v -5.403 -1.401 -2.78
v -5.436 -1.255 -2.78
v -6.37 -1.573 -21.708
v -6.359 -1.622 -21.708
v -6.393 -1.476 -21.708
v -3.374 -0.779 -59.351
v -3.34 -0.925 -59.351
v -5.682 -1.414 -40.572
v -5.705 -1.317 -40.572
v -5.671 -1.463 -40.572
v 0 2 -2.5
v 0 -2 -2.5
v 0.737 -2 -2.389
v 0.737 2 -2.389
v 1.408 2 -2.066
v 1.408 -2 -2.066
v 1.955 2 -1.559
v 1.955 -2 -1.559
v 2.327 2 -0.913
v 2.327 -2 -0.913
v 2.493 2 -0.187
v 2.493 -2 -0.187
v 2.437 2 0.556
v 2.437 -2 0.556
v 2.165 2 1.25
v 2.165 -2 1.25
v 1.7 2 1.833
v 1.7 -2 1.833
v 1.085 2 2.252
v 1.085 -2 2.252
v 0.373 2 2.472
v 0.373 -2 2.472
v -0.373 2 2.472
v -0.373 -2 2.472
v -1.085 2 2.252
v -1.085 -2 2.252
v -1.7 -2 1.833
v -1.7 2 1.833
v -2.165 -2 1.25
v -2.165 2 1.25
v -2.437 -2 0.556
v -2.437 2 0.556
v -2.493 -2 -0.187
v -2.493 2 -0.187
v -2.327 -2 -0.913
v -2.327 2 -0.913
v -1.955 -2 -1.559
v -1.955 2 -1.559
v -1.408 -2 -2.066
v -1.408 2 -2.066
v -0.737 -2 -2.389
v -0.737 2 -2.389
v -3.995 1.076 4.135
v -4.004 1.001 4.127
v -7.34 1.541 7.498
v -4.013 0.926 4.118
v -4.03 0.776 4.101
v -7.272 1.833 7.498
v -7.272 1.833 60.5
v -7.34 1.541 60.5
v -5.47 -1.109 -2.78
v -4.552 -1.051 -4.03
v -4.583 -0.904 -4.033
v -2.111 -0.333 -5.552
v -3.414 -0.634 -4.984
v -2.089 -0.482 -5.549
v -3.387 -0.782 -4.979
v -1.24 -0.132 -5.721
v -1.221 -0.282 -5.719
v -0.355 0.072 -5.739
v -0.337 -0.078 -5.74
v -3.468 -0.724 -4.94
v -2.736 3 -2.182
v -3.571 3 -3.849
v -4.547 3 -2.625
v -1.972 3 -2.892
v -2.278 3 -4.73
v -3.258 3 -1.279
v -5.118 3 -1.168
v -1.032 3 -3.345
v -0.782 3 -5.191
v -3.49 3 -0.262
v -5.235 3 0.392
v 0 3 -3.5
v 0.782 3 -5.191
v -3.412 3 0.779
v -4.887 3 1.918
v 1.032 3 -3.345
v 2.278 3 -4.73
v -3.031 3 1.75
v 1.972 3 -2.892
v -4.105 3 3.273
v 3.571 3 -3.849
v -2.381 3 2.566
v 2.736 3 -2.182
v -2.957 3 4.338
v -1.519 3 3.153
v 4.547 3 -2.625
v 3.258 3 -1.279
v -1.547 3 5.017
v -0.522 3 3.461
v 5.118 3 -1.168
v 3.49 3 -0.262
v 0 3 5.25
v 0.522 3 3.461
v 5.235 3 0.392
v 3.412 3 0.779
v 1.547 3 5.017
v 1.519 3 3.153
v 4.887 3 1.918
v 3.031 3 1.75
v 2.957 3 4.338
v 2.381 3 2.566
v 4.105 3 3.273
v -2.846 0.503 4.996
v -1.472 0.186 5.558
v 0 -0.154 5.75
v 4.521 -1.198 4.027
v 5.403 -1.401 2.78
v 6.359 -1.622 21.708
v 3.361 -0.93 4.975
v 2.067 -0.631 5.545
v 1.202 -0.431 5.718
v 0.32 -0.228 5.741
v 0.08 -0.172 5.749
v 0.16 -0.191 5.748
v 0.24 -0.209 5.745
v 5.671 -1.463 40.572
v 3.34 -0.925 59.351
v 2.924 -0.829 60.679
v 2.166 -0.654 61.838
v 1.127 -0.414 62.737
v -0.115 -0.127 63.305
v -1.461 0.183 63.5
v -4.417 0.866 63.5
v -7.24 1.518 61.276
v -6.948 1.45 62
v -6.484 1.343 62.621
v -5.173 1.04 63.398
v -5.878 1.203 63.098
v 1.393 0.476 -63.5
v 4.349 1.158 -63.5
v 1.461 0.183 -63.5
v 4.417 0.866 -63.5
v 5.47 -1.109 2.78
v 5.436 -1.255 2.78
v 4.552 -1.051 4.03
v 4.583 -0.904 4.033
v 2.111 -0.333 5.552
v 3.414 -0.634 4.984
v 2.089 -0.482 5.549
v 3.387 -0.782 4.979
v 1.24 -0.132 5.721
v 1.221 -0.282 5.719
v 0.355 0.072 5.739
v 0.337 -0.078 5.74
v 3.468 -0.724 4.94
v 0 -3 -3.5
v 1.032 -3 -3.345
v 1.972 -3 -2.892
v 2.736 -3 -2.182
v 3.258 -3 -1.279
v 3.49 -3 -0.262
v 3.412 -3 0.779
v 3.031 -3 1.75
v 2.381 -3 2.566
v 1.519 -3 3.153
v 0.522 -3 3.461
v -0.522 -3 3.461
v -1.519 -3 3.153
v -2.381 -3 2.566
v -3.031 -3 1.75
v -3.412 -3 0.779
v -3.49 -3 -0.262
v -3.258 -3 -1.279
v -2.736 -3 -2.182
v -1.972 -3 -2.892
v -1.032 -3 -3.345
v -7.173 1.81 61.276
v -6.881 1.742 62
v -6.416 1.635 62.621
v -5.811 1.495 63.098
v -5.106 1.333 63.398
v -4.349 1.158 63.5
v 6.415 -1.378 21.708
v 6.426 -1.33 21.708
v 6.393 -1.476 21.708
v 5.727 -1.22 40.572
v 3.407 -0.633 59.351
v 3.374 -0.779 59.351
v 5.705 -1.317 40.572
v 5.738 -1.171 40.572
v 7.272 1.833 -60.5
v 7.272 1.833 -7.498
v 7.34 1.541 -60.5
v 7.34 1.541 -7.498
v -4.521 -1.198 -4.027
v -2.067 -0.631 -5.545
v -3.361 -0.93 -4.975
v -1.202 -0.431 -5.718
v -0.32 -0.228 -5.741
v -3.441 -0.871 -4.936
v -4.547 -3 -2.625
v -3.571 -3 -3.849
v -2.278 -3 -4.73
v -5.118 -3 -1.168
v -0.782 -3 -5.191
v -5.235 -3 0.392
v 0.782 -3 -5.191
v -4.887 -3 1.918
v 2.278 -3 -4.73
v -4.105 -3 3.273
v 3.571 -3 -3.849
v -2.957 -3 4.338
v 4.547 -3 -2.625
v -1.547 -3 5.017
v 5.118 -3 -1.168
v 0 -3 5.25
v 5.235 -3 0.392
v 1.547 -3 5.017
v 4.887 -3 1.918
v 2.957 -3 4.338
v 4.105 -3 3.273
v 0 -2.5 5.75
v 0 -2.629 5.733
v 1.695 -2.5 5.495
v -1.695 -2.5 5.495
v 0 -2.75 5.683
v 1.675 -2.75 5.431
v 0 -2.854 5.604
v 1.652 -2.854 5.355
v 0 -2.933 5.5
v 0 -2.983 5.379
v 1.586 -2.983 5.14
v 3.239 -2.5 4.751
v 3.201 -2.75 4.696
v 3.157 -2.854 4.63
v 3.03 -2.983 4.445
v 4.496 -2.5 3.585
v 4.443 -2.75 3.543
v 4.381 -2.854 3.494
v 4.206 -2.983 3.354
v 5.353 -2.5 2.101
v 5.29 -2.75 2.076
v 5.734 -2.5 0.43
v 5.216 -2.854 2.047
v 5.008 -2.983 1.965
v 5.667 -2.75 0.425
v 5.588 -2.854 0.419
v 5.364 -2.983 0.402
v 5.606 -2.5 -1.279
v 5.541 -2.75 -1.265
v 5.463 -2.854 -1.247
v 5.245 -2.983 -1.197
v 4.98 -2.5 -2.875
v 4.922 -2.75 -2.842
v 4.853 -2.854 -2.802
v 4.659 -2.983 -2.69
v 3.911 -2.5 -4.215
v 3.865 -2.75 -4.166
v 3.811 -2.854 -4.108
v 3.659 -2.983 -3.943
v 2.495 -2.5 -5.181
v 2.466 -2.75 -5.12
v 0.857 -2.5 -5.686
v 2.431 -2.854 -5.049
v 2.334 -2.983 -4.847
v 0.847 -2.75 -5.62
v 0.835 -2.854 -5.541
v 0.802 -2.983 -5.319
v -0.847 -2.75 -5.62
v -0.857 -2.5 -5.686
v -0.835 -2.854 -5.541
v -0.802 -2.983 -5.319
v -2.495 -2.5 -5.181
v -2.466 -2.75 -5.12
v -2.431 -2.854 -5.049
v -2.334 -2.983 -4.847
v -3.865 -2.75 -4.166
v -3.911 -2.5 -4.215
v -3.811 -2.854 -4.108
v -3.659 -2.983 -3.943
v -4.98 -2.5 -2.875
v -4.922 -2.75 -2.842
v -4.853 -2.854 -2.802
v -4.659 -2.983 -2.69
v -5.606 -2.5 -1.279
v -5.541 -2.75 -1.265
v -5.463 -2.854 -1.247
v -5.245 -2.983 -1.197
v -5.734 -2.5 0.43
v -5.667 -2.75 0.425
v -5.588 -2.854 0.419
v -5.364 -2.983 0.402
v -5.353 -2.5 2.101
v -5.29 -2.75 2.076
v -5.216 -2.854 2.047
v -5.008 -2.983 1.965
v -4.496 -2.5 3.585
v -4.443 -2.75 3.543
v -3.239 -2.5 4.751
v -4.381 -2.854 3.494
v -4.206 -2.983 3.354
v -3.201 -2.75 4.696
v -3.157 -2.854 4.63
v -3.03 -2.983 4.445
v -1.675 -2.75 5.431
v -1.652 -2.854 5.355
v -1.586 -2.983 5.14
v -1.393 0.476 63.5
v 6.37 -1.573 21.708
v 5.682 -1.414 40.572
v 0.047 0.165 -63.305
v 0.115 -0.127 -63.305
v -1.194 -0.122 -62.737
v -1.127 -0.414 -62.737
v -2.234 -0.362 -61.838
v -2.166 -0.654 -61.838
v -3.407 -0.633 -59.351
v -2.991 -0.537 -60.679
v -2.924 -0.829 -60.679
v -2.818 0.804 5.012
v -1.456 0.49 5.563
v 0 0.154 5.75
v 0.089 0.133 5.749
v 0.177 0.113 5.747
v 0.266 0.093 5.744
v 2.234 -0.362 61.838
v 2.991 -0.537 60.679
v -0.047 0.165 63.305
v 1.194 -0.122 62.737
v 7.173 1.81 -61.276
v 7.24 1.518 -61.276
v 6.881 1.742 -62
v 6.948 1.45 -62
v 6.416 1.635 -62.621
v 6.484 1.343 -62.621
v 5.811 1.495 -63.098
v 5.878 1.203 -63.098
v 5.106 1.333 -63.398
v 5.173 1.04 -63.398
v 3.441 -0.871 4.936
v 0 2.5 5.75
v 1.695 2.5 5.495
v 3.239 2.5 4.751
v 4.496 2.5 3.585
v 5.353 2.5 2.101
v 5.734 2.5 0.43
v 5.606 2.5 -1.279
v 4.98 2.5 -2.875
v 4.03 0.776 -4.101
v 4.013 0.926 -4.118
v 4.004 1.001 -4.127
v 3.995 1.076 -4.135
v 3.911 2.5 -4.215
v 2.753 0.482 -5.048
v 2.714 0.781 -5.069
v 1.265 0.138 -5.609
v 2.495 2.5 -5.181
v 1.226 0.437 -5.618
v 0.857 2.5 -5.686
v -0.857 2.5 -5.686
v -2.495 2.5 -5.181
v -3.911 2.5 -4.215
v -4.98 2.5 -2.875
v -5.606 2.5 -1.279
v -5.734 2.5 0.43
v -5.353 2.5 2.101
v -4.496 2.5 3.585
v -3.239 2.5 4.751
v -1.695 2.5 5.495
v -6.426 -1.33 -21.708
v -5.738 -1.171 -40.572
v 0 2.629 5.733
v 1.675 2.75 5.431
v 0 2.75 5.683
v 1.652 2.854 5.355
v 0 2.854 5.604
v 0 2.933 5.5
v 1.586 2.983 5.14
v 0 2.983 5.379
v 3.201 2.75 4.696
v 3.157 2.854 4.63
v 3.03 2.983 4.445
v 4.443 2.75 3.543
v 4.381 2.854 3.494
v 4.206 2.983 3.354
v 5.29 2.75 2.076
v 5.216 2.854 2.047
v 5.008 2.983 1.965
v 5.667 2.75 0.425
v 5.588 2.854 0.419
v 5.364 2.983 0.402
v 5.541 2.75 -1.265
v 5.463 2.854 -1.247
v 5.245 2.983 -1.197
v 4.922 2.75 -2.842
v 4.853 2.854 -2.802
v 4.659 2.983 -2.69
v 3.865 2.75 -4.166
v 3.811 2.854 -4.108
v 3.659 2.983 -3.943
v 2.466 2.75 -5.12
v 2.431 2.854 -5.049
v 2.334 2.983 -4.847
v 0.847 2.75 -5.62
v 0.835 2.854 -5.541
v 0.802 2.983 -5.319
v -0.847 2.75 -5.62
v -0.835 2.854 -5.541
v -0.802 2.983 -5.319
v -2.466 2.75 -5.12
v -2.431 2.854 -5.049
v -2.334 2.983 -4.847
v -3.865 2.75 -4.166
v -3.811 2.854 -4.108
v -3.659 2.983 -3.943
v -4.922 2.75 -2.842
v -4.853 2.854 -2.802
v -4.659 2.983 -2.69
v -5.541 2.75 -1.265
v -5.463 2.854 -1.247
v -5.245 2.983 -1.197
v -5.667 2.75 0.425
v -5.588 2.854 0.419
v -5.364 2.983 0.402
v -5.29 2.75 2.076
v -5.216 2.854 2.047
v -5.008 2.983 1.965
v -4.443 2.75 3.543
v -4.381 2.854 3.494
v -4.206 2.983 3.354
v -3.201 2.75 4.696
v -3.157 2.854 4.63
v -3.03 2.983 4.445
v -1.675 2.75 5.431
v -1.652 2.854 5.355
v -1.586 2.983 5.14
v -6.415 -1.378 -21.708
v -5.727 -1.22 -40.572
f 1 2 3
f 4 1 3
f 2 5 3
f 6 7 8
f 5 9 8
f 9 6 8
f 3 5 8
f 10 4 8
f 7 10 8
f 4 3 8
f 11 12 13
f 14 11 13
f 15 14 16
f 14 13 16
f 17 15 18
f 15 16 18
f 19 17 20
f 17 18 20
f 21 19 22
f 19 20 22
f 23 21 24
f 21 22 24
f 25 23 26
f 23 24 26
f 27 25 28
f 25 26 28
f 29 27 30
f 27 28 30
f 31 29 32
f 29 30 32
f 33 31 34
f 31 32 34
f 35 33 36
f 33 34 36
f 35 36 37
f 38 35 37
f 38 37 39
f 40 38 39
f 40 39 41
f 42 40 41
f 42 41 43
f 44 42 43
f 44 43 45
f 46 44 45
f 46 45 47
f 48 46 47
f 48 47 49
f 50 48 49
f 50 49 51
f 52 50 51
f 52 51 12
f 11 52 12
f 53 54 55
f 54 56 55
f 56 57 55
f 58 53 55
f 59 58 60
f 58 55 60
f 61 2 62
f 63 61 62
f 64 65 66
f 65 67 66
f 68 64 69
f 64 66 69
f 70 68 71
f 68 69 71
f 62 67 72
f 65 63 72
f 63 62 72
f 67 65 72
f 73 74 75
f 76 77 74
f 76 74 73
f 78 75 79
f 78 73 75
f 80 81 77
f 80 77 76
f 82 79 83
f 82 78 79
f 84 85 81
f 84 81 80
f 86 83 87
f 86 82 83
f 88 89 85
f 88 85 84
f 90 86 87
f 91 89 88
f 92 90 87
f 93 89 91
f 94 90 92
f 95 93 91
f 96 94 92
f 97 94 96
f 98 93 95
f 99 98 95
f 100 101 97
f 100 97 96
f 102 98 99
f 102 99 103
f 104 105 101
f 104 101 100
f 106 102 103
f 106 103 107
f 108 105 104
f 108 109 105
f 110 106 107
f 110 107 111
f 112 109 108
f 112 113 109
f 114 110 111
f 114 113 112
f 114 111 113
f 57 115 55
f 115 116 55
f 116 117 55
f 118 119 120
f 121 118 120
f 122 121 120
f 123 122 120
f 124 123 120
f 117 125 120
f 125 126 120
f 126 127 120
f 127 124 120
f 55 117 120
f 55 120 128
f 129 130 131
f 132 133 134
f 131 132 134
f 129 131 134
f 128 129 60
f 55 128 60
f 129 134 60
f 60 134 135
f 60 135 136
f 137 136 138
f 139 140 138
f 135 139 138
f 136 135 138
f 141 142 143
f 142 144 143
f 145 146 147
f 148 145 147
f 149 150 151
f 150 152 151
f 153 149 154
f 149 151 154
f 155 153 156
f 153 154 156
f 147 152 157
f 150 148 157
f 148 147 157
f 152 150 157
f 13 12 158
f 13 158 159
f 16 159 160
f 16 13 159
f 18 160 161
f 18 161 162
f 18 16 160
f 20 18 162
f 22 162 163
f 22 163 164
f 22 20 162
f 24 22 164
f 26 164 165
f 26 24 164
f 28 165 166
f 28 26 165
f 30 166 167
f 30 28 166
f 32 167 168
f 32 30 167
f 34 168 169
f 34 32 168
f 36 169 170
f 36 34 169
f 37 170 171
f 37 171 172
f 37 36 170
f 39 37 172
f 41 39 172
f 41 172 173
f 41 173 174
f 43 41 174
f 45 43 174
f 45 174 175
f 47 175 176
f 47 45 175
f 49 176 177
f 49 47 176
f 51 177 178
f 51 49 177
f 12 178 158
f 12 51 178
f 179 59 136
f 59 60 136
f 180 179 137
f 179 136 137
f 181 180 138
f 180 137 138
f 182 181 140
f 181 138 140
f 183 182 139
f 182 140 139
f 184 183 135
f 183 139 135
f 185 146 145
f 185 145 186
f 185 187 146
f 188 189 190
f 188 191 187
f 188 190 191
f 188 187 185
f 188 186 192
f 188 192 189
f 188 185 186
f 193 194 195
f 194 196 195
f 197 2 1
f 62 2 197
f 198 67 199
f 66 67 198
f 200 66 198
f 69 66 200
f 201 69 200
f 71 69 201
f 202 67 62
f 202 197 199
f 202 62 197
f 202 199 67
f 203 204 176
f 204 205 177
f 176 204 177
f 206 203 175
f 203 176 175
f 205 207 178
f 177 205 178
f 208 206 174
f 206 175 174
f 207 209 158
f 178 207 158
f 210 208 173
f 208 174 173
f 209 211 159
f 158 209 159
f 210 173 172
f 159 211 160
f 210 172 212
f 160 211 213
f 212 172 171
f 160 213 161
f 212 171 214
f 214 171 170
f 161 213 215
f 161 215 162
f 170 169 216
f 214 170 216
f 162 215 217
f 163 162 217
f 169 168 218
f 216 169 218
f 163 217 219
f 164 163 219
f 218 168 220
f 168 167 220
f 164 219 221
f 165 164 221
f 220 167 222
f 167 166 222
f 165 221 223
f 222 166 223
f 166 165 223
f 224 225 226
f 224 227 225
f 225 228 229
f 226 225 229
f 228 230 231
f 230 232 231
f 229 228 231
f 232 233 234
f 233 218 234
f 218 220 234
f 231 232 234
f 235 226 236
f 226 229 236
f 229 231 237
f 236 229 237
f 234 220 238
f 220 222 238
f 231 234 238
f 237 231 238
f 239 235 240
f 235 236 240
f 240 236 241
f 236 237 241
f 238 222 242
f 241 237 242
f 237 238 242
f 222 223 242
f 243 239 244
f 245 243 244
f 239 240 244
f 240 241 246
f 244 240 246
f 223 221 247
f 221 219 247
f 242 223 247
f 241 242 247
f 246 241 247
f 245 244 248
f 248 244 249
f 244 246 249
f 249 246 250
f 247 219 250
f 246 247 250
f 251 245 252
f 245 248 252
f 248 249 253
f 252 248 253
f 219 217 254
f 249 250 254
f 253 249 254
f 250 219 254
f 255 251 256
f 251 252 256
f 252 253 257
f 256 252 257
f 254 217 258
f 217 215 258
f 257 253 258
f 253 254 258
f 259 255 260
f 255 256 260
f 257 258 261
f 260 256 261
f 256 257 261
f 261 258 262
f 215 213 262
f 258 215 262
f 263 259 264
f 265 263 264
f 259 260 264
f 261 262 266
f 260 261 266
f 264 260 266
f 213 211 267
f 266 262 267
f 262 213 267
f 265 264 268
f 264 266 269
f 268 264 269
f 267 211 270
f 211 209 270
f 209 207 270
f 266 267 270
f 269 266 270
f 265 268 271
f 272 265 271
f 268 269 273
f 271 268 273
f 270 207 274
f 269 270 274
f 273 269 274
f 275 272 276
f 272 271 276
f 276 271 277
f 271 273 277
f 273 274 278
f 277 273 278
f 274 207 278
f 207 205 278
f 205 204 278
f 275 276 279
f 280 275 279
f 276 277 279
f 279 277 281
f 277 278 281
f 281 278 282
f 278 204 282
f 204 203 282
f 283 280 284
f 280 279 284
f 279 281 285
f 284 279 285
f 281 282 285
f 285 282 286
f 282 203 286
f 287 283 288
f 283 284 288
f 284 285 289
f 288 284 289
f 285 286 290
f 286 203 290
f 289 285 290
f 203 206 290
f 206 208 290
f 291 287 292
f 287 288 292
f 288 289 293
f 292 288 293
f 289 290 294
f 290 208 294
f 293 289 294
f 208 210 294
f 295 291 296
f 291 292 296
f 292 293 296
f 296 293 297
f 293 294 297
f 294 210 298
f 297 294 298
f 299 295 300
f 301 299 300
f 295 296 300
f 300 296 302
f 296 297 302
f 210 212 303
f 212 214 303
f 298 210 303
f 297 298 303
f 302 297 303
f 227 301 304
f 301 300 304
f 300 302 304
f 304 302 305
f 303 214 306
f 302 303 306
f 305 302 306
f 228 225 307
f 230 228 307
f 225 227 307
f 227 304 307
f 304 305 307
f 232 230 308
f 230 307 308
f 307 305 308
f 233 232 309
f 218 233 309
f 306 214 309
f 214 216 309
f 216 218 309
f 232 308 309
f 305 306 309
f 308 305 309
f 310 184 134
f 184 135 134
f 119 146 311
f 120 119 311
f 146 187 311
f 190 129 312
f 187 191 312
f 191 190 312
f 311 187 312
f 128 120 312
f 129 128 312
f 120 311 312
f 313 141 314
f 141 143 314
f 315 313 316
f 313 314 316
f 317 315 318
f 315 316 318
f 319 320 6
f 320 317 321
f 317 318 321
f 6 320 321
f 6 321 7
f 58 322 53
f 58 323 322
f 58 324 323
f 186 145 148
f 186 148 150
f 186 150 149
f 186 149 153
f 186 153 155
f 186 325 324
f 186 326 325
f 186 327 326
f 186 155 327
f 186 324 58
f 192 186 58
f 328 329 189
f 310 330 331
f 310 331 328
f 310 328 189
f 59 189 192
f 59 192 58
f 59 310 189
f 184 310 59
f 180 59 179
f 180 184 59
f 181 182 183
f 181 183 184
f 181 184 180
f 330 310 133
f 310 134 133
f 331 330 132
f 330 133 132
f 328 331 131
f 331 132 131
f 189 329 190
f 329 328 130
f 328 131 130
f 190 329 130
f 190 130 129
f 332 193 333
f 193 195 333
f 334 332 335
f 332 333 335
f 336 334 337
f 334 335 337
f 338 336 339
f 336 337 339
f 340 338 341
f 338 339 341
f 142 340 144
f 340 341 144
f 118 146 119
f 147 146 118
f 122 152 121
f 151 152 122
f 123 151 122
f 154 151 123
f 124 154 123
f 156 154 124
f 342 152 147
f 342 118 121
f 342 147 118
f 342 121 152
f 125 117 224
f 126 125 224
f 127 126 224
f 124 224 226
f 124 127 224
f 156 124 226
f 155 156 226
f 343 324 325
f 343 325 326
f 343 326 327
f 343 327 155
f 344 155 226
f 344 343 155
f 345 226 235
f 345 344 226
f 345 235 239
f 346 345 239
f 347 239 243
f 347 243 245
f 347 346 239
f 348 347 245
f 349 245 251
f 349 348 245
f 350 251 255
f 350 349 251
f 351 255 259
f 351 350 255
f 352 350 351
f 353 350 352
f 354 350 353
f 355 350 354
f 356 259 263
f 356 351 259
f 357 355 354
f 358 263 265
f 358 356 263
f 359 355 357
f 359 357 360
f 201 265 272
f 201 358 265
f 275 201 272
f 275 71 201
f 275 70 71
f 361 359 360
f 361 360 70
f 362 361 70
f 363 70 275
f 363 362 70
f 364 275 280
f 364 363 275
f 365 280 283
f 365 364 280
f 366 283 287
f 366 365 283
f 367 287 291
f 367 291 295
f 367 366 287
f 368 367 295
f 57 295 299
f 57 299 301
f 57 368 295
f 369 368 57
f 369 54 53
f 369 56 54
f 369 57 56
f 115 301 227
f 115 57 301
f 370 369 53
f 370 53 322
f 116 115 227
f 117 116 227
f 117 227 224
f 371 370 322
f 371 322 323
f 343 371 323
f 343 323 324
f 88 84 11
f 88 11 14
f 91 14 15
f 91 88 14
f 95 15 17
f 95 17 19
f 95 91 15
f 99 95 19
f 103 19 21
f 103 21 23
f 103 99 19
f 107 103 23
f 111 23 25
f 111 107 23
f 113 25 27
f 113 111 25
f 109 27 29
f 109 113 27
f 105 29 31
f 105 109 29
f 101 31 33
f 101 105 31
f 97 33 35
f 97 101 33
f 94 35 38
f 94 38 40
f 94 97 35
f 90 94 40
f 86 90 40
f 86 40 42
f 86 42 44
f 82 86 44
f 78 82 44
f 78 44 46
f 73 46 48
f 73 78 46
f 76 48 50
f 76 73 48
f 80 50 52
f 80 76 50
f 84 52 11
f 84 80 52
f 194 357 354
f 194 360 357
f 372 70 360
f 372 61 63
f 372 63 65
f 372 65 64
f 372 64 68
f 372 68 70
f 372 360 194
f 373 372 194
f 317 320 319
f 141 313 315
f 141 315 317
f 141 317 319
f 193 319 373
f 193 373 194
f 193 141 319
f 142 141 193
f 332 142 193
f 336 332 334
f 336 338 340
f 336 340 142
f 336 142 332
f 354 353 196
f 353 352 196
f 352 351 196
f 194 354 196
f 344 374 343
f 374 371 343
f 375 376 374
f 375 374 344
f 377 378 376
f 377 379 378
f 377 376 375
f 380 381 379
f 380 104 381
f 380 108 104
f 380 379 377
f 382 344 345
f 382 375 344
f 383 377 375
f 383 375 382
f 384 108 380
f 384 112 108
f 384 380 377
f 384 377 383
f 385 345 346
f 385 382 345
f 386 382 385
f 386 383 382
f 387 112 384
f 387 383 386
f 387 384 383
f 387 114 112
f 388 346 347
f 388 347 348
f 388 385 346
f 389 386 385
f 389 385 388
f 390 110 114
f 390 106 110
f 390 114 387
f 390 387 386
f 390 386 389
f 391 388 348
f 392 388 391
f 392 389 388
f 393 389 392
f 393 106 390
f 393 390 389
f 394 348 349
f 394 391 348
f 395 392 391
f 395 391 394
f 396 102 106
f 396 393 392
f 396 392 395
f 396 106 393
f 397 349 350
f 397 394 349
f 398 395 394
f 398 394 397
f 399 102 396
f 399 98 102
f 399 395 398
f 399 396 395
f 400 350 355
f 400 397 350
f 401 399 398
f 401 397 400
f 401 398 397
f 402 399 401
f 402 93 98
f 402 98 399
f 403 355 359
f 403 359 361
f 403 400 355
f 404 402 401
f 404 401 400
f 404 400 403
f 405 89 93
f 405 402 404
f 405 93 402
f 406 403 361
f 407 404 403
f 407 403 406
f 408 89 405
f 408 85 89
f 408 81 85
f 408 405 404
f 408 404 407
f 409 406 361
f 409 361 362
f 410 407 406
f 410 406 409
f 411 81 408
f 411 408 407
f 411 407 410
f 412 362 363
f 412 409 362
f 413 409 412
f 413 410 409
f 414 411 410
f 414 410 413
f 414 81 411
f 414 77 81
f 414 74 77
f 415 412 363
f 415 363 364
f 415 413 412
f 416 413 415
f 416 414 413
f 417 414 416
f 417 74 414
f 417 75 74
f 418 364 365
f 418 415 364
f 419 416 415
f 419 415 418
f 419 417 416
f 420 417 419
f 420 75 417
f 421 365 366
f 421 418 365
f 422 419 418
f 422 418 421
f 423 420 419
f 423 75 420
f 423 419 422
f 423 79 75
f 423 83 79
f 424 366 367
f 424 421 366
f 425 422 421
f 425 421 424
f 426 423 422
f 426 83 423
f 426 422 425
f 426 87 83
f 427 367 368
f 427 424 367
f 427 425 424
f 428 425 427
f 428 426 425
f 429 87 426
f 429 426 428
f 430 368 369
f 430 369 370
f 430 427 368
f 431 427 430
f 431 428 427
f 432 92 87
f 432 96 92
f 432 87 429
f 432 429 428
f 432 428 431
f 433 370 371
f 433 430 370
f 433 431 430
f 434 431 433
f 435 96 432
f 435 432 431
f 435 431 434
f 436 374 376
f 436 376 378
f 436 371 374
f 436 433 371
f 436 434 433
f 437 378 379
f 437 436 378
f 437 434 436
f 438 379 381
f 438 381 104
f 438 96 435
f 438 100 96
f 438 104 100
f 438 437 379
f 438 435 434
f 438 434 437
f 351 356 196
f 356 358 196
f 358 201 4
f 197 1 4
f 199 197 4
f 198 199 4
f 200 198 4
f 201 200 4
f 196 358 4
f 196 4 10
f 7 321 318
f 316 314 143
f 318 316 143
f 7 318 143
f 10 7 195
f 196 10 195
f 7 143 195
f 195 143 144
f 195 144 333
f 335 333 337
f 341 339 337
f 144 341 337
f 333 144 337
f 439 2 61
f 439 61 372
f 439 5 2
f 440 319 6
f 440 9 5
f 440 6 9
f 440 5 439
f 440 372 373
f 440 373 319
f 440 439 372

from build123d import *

# Parameters (mm, degrees)
SKETCH1_R           = 5.75
BOSS_EXTRUDE1_DEPTH = 3
BOSS_EXTRUDE2_DEPTH = 0.15
CIRPATTERN1_COUNT   = 2
SKETCH4_R           = 2.5
CUT_EXTRUDE1_DEPTH  = 65.203765671
FILLET1_R           = 0.5
CHAMFER1_SIZE       = 1
CHAMFER2_SIZE       = 1


with BuildPart() as part:
    # Sketch1 → Boss-Extrude1 (new, symmetric)
    with BuildSketch(Plane(origin=(0, 0, 0), x_dir=(1, 0, 0), z_dir=(0, 1, 0))):
        with Locations(Location((0, 0, 0), (0, 0, 270))):
            Circle(SKETCH1_R)
    extrude(amount=BOSS_EXTRUDE1_DEPTH, both=True)

    # Sketch3 → Boss-Extrude2 (add, symmetric)
    with BuildSketch(Plane(origin=(0, 0, 0), x_dir=(0.9743700647852352, -0.22495105434386534, 0), z_dir=(-0.22495105434386534, -0.9743700647852352, 0))):
        with BuildLine():
            Line((-3.652357561, 3.652357561), (-7.49829587, 7.49829587))
            Line((-7.49829587, 7.49829587), (-7.49829587, 60.5))
            ThreePointArc((-7.49829587, 60.5), (-6.619616214, 62.621320344), (-4.49829587, 63.5))
            Line((-4.49829587, 63.5), (-1.464719741, 63.5))
            ThreePointArc((-1.464719741, 63.5), (1.755916544, 62.324591732), (3.462327822, 59.351000768))
            add(Edge.make_bspline(
                [(5.579389338, 2.779553643), (7.404721725, 21.734683746), (6.697564401, 40.619919544), (3.462327822, 59.351000768)],
                knots=[0, 0, 0, 0, 0.931210361, 0.931210361, 0.931210361, 0.931210361], degree=3))
            add(Edge.make_bspline(
                [(5.579389338, 2.779553643), (1.589885299, 10.194259474), (-3.652357561, 3.652357561)],
                knots=[5.216924211, 5.216924211, 5.216924211, 7.165723747, 7.165723747, 7.165723747], degree=2, weights=[1, 0.561664766, 1]))
        make_face()
    boss_extrude2 = extrude(amount=BOSS_EXTRUDE2_DEPTH, both=True)

    # CirPattern1: Boss-Extrude2 ×2 about axis
    cirpattern1_axis = Axis((0, 3, 0), (0, -1, 0))
    for i in range(1, CIRPATTERN1_COUNT):
        add(boss_extrude2.rotate(cirpattern1_axis, i * 360 / CIRPATTERN1_COUNT))

    # Sketch4 → Cut-Extrude1 (cut, through all)
    with BuildSketch(Plane.XZ.offset(3)):
        with Locations(Location((0, 0, 0), (0, 0, 270))):
            Circle(SKETCH4_R)
    extrude(amount=-CUT_EXTRUDE1_DEPTH, mode=Mode.SUBTRACT)

    # Fillet1
    fillet1_edges = [part.edges().sort_by_distance(p)[0] for p in [
        (0, -3, -5.75),
        (0, 3, -5.75),
    ]]
    fillet(fillet1_edges, radius=FILLET1_R)

    # Chamfer1
    chamfer1_edges = [part.edges().sort_by_distance(p)[0] for p in [
        (0, -3, 2.5),
    ]]
    chamfer(chamfer1_edges, length=CHAMFER1_SIZE)

    # Chamfer2
    chamfer2_edges = [part.edges().sort_by_distance(p)[0] for p in [
        (0, 3, 2.5),
    ]]
    chamfer(chamfer2_edges, length=CHAMFER2_SIZE)


solid = part.part
